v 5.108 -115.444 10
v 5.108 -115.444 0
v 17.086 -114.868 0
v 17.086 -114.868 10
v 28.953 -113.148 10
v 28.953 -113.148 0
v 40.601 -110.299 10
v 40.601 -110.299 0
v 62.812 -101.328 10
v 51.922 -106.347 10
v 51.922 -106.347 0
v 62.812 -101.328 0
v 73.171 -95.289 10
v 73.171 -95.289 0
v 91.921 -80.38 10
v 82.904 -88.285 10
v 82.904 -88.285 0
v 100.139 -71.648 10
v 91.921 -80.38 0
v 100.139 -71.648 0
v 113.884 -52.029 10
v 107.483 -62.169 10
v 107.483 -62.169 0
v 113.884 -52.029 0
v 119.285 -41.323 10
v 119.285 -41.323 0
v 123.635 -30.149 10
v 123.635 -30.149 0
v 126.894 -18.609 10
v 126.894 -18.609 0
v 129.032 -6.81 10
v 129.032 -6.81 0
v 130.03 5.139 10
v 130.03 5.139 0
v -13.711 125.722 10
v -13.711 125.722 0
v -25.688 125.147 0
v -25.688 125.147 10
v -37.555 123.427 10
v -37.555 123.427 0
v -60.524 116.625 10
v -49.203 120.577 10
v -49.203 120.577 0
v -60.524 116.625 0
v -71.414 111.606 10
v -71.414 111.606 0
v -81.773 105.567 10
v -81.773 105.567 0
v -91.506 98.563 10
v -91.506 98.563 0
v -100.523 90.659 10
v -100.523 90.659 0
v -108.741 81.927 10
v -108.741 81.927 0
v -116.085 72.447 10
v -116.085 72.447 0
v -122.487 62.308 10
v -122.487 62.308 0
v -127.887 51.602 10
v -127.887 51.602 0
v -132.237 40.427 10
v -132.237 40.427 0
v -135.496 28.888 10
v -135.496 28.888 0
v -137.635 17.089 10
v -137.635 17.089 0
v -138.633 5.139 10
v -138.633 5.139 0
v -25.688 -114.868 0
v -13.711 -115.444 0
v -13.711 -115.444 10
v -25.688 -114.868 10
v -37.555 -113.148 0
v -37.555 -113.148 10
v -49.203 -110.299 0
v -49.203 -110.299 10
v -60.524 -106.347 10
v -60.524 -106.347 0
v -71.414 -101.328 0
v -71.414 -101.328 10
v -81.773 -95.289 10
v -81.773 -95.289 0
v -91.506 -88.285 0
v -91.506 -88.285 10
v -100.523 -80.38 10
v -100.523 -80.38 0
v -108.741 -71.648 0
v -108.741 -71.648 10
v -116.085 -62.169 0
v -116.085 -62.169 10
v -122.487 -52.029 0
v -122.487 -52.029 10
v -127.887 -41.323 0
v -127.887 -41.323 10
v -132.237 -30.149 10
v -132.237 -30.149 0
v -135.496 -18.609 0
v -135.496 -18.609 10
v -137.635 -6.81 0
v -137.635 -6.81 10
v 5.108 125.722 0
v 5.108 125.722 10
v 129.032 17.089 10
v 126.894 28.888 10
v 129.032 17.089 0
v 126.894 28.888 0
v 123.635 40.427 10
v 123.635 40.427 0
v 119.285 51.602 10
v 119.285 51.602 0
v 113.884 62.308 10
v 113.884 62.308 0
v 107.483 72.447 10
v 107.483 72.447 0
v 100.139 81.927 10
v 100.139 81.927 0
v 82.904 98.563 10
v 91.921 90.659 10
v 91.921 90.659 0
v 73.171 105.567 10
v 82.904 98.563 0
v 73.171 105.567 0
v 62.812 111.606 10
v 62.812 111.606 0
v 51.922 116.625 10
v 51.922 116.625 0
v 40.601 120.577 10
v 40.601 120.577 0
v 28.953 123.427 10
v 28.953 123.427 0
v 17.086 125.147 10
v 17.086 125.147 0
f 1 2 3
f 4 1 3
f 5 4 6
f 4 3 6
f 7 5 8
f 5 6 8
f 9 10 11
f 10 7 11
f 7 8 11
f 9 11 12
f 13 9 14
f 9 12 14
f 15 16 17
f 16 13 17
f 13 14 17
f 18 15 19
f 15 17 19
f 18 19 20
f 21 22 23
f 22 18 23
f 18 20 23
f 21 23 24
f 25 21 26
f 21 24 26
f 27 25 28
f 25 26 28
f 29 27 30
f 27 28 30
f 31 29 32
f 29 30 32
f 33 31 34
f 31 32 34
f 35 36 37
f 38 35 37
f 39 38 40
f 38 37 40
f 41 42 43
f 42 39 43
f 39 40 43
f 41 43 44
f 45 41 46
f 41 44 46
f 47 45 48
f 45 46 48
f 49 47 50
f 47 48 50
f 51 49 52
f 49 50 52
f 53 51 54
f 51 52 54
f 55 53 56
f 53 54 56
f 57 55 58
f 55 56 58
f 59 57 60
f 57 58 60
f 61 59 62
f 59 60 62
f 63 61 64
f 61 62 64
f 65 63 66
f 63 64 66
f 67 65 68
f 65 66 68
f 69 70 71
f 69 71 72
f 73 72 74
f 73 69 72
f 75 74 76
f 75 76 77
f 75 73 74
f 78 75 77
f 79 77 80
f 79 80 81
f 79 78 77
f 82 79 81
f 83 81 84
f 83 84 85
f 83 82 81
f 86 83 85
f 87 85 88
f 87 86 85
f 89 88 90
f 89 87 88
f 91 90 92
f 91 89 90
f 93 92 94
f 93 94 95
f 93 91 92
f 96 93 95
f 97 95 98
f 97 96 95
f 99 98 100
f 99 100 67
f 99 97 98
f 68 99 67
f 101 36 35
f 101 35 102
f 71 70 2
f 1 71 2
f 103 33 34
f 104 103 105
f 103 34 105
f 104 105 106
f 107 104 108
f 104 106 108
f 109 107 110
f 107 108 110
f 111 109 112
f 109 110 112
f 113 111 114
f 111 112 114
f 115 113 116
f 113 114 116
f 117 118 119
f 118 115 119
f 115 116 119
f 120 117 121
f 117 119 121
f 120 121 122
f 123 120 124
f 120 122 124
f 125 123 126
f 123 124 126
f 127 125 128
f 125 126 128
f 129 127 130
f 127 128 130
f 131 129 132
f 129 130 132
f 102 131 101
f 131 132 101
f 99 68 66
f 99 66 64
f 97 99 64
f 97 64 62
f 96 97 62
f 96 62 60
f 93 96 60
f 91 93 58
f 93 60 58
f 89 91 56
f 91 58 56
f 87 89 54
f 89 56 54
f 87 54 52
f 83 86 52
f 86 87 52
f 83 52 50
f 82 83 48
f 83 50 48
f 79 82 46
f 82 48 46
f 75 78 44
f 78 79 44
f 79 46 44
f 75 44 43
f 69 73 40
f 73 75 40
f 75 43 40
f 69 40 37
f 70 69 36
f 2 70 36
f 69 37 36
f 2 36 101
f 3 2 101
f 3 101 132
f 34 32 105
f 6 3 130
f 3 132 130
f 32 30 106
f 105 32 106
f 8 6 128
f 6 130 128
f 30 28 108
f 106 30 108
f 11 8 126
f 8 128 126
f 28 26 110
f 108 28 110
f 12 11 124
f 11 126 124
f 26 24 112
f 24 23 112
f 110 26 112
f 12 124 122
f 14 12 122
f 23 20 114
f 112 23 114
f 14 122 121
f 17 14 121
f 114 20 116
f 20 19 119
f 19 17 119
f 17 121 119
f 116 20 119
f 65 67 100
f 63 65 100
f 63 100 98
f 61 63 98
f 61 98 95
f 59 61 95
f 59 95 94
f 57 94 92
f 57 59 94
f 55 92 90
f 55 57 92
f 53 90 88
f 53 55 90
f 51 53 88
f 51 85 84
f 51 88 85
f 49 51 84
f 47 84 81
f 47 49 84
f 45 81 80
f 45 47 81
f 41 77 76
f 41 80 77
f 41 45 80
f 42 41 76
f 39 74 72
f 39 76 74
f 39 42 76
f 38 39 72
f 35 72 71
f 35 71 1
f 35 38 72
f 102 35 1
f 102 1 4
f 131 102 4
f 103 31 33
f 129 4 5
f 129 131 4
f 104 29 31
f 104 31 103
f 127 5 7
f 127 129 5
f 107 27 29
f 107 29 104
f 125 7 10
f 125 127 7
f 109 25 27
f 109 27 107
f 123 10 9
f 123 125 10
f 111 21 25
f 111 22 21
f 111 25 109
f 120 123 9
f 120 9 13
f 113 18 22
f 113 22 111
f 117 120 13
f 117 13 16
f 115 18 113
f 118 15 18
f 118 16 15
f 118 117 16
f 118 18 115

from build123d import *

# Parameters (mm, degrees)
F0_W        = 268.8191002235
F0_H        = 241.1657162011
F1_DEPTH    = 10
F2_T1_DEPTH = 635


# Not quite as in the source:
# - a fillet or chamfer that OpenCascade refuses, or shapes differently, is made with other operations: its cross-section is extruded or revolved along the edge and cut away or added


with BuildPart() as f1:
    # F0 (on Top) → F1 (new body)
    with BuildSketch(Plane.XY):
        with Locations((-4.3010744266, 5.1392484456)):
            Rectangle(F0_W, F0_H)
    extrude(amount=F1_DEPTH)

    # F2: fillet of radius 125 on 4 edges, made by hand

    # F2_s2 → F2_t1 (cut)
    with BuildSketch(Plane.XY.offset(-312.5)):
        with BuildLine():
            ThreePointArc((-13.7106245384, -115.4436096549), (-102.0989721867, -78.8319573032), (-138.7106245384, 9.5563903451))
            Line((-138.7106245384, 9.5563903451), (-138.7106245384, -115.4436096549))
            Line((-138.7106245384, -115.4436096549), (-13.7106245384, -115.4436096549))
        make_face()
        with BuildLine():
            ThreePointArc((5.1084756851, -115.4436096549), (93.4968233334, -78.8319573032), (130.1084756851, 9.5563903451))
            Line((130.1084756851, 9.5563903451), (130.1084756851, -115.4436096549))
            Line((130.1084756851, -115.4436096549), (5.1084756851, -115.4436096549))
        make_face()
        with BuildLine():
            ThreePointArc((130.1084756851, 0.7221065462), (93.4968233334, 89.1104541945), (5.1084756851, 125.7221065462))
            Line((5.1084756851, 125.7221065462), (130.1084756851, 125.7221065462))
            Line((130.1084756851, 125.7221065462), (130.1084756851, 0.7221065462))
        make_face()
        with BuildLine():
            ThreePointArc((-13.7106245384, 125.7221065462), (-102.0989721867, 89.1104541945), (-138.7106245384, 0.7221065462))
            Line((-138.7106245384, 0.7221065462), (-138.7106245384, 125.7221065462))
            Line((-138.7106245384, 125.7221065462), (-13.7106245384, 125.7221065462))
        make_face()
    extrude(amount=F2_T1_DEPTH, mode=Mode.SUBTRACT)


solid = f1.part
